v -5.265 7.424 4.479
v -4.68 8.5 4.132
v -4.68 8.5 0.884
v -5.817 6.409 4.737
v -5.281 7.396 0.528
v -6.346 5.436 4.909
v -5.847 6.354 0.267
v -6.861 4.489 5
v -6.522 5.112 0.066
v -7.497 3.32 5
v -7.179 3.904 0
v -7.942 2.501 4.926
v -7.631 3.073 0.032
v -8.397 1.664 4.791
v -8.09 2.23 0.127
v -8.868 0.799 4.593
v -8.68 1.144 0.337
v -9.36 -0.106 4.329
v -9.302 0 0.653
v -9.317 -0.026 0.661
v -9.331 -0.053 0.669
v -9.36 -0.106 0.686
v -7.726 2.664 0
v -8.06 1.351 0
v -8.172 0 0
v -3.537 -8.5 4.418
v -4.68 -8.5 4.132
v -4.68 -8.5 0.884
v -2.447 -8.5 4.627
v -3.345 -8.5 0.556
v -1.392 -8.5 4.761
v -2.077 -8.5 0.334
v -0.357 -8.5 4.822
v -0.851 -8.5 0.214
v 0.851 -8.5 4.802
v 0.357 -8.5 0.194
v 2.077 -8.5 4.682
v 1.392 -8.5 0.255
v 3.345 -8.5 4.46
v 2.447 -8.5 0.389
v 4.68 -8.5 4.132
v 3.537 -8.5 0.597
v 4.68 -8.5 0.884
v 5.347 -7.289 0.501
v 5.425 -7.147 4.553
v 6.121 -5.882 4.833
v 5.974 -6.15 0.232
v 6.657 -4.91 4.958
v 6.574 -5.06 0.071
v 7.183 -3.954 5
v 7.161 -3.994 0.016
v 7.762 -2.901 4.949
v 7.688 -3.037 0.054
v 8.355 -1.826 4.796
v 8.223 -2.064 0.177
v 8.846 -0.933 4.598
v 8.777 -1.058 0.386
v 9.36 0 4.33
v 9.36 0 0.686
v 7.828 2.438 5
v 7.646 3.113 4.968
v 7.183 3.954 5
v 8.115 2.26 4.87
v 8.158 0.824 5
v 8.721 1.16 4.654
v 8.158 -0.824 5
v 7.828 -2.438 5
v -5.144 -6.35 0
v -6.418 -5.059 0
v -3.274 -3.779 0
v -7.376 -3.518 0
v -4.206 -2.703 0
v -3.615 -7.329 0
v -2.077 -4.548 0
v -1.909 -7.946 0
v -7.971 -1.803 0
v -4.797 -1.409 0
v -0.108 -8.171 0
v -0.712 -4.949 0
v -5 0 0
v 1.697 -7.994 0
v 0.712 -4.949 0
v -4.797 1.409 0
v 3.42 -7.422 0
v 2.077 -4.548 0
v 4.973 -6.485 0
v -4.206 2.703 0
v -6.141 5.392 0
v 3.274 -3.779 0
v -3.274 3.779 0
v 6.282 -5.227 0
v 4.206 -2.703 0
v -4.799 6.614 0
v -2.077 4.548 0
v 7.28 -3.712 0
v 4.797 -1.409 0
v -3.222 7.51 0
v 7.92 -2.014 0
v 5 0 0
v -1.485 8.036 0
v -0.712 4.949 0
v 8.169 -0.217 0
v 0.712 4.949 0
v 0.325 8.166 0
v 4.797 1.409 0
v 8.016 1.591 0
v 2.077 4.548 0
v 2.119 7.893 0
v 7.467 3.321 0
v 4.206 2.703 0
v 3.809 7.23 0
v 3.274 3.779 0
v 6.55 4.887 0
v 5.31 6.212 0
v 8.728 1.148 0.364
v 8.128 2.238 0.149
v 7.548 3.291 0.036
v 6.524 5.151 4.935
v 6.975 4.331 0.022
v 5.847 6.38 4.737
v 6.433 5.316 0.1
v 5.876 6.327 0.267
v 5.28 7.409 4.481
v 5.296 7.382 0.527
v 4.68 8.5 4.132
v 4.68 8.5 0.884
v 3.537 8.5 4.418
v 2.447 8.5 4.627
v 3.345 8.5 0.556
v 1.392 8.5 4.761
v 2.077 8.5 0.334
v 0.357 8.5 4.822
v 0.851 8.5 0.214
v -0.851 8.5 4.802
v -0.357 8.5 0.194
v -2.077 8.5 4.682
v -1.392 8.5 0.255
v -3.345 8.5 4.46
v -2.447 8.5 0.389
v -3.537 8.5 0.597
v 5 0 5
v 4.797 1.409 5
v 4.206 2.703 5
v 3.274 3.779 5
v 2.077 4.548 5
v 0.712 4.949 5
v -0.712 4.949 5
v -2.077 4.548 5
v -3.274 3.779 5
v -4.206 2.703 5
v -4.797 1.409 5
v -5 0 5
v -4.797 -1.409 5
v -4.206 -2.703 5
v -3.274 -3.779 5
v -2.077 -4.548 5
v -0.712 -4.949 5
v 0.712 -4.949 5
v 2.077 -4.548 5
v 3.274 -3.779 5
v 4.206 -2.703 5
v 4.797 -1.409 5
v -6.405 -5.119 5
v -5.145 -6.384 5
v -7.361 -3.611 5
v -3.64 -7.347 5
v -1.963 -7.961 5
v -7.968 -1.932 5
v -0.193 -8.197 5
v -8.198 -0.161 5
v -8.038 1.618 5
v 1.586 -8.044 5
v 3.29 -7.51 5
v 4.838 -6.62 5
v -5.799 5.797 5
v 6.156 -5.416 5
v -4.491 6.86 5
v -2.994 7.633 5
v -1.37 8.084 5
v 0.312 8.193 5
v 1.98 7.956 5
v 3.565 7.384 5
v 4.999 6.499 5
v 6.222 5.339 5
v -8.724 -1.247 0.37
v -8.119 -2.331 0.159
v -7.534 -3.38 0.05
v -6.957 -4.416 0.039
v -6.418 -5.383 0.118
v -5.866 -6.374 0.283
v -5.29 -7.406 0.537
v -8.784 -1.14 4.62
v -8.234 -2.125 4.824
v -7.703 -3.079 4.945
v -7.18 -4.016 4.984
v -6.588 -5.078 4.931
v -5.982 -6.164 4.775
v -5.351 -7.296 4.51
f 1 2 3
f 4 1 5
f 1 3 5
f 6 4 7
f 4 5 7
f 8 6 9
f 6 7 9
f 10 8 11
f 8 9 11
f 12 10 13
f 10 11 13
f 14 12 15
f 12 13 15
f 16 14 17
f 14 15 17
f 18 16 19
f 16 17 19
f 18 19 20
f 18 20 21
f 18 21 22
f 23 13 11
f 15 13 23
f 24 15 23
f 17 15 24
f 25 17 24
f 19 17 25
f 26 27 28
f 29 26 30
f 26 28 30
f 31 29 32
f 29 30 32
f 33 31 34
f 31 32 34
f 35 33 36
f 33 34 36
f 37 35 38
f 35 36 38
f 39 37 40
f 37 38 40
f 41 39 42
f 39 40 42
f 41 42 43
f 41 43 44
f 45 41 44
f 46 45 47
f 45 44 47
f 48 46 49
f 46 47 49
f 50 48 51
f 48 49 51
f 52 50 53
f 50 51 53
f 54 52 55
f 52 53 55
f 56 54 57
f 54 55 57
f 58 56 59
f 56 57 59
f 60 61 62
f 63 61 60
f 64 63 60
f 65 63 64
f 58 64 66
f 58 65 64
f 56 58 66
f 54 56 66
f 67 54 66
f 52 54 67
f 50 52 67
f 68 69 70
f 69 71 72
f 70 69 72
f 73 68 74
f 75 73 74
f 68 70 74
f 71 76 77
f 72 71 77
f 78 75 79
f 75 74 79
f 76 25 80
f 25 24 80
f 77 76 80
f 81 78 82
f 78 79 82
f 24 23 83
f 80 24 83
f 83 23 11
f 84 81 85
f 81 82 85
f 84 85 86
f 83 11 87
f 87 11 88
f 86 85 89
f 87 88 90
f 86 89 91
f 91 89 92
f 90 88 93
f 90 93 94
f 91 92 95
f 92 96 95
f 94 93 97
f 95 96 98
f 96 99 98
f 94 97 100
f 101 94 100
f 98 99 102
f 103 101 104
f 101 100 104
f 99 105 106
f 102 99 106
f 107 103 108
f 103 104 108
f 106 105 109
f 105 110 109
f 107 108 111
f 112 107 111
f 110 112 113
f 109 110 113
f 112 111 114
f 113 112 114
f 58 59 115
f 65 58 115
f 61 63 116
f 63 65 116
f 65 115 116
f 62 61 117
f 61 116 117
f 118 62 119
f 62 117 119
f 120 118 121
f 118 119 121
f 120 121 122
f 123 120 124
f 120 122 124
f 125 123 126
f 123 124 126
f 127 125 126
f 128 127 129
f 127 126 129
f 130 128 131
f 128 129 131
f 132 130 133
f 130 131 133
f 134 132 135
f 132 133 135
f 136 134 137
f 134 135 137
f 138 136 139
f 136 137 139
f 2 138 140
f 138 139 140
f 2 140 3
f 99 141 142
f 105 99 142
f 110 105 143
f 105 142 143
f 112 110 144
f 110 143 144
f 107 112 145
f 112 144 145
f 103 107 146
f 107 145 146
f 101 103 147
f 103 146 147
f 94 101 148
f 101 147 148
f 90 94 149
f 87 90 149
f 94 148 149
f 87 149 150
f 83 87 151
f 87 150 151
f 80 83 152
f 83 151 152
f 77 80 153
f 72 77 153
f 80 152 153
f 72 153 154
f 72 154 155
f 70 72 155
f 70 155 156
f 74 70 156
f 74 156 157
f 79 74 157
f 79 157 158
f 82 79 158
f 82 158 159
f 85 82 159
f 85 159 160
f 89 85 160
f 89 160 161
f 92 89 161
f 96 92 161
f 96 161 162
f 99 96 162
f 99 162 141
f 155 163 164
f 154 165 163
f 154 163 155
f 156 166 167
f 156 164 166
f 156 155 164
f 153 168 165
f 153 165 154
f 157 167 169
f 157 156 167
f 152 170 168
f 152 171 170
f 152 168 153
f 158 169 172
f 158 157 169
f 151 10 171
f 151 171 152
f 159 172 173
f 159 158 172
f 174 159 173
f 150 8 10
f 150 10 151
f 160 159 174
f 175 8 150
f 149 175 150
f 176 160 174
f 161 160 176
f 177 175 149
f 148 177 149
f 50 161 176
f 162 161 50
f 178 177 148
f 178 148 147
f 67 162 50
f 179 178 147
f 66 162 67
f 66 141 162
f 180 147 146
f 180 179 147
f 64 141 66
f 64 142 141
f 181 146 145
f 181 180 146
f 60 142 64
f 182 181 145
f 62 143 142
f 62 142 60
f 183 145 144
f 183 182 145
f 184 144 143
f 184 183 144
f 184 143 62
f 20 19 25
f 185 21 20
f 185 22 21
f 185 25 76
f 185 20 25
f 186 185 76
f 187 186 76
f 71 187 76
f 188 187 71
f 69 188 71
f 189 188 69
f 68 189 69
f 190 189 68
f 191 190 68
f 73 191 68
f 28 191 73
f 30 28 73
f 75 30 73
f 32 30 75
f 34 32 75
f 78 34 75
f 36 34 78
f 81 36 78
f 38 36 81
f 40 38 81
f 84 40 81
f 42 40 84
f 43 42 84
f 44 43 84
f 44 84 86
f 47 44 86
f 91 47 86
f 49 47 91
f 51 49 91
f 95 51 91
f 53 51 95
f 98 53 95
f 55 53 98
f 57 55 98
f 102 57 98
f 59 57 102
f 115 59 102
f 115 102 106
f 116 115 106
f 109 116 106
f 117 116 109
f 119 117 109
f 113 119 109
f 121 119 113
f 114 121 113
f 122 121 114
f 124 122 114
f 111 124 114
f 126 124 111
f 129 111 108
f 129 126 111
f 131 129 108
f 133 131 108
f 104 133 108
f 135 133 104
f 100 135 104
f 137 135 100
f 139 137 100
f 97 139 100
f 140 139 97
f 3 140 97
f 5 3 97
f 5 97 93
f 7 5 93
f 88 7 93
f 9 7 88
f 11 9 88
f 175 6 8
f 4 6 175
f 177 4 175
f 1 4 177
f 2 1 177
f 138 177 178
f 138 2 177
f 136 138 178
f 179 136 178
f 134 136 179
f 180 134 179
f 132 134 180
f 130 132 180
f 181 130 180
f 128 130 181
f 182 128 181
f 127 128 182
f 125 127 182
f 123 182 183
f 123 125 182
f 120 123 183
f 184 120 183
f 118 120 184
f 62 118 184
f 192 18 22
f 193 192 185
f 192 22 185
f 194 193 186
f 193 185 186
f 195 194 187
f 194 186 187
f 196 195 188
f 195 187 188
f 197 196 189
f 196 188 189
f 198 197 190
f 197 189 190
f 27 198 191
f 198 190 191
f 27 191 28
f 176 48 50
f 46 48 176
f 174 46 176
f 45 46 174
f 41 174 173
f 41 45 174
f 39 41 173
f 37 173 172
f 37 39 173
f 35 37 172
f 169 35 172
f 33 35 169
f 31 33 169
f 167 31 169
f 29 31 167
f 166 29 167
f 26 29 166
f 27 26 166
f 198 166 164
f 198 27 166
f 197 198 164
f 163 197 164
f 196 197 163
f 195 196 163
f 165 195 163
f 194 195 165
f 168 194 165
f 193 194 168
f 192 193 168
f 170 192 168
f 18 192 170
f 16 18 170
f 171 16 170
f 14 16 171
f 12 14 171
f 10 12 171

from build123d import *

# Parameters (mm, degrees)
BOSS_EXTRUDE1_DEPTH = 5
SKETCH2_OUTSIDE_W   = 60.516
SKETCH2_OUTSIDE_H   = 58.796
SKETCH2_OUTSIDE_R   = 8.199202844
CUT_EXTRUDE1_DEPTH  = 10
CUT_EXTRUDE1_TAPER  = 60
SKETCH3_OUTSIDE_W   = 29.34
SKETCH3_OUTSIDE_H   = 27.62
SKETCH3_OUTSIDE_R   = 8.172152793
CUT_EXTRUDE2_DEPTH  = 1
CUT_EXTRUDE2_TAPER  = 60
SKETCH4_R           = 5
CUT_EXTRUDE3_DEPTH  = 8


with BuildPart() as part:
    # Sketch1 → Boss-Extrude1 (new body)
    with BuildSketch(Plane.XY):
        Polygon((9.359699903, 0), (4.68, 8.5), (-4.68, 8.5), (-9.36, -0.105997779), (-4.68, -8.5), (4.68, -8.5), align=None)
    extrude(amount=BOSS_EXTRUDE1_DEPTH)

    # Sketch2 outside → Cut-Extrude1 (cut)
    with BuildSketch(Plane.XY.offset(5)):
        Rectangle(SKETCH2_OUTSIDE_W, SKETCH2_OUTSIDE_H)
        Circle(SKETCH2_OUTSIDE_R, mode=Mode.SUBTRACT)
    extrude(amount=-CUT_EXTRUDE1_DEPTH, taper=CUT_EXTRUDE1_TAPER, mode=Mode.SUBTRACT)

    # Sketch3 outside → Cut-Extrude2 (cut)
    with BuildSketch(Plane(origin=(0, 0, 0), x_dir=(-1, 0, 0), z_dir=(0, 0, -1))):
        Rectangle(SKETCH3_OUTSIDE_W, SKETCH3_OUTSIDE_H)
        Circle(SKETCH3_OUTSIDE_R, mode=Mode.SUBTRACT)
    extrude(amount=-CUT_EXTRUDE2_DEPTH, taper=CUT_EXTRUDE2_TAPER, mode=Mode.SUBTRACT)

    # Sketch4 → Cut-Extrude3 (cut)
    with BuildSketch(Plane.XY.offset(5)):
        Circle(SKETCH4_R)
    extrude(amount=-CUT_EXTRUDE3_DEPTH, mode=Mode.SUBTRACT)


solid = part.part
